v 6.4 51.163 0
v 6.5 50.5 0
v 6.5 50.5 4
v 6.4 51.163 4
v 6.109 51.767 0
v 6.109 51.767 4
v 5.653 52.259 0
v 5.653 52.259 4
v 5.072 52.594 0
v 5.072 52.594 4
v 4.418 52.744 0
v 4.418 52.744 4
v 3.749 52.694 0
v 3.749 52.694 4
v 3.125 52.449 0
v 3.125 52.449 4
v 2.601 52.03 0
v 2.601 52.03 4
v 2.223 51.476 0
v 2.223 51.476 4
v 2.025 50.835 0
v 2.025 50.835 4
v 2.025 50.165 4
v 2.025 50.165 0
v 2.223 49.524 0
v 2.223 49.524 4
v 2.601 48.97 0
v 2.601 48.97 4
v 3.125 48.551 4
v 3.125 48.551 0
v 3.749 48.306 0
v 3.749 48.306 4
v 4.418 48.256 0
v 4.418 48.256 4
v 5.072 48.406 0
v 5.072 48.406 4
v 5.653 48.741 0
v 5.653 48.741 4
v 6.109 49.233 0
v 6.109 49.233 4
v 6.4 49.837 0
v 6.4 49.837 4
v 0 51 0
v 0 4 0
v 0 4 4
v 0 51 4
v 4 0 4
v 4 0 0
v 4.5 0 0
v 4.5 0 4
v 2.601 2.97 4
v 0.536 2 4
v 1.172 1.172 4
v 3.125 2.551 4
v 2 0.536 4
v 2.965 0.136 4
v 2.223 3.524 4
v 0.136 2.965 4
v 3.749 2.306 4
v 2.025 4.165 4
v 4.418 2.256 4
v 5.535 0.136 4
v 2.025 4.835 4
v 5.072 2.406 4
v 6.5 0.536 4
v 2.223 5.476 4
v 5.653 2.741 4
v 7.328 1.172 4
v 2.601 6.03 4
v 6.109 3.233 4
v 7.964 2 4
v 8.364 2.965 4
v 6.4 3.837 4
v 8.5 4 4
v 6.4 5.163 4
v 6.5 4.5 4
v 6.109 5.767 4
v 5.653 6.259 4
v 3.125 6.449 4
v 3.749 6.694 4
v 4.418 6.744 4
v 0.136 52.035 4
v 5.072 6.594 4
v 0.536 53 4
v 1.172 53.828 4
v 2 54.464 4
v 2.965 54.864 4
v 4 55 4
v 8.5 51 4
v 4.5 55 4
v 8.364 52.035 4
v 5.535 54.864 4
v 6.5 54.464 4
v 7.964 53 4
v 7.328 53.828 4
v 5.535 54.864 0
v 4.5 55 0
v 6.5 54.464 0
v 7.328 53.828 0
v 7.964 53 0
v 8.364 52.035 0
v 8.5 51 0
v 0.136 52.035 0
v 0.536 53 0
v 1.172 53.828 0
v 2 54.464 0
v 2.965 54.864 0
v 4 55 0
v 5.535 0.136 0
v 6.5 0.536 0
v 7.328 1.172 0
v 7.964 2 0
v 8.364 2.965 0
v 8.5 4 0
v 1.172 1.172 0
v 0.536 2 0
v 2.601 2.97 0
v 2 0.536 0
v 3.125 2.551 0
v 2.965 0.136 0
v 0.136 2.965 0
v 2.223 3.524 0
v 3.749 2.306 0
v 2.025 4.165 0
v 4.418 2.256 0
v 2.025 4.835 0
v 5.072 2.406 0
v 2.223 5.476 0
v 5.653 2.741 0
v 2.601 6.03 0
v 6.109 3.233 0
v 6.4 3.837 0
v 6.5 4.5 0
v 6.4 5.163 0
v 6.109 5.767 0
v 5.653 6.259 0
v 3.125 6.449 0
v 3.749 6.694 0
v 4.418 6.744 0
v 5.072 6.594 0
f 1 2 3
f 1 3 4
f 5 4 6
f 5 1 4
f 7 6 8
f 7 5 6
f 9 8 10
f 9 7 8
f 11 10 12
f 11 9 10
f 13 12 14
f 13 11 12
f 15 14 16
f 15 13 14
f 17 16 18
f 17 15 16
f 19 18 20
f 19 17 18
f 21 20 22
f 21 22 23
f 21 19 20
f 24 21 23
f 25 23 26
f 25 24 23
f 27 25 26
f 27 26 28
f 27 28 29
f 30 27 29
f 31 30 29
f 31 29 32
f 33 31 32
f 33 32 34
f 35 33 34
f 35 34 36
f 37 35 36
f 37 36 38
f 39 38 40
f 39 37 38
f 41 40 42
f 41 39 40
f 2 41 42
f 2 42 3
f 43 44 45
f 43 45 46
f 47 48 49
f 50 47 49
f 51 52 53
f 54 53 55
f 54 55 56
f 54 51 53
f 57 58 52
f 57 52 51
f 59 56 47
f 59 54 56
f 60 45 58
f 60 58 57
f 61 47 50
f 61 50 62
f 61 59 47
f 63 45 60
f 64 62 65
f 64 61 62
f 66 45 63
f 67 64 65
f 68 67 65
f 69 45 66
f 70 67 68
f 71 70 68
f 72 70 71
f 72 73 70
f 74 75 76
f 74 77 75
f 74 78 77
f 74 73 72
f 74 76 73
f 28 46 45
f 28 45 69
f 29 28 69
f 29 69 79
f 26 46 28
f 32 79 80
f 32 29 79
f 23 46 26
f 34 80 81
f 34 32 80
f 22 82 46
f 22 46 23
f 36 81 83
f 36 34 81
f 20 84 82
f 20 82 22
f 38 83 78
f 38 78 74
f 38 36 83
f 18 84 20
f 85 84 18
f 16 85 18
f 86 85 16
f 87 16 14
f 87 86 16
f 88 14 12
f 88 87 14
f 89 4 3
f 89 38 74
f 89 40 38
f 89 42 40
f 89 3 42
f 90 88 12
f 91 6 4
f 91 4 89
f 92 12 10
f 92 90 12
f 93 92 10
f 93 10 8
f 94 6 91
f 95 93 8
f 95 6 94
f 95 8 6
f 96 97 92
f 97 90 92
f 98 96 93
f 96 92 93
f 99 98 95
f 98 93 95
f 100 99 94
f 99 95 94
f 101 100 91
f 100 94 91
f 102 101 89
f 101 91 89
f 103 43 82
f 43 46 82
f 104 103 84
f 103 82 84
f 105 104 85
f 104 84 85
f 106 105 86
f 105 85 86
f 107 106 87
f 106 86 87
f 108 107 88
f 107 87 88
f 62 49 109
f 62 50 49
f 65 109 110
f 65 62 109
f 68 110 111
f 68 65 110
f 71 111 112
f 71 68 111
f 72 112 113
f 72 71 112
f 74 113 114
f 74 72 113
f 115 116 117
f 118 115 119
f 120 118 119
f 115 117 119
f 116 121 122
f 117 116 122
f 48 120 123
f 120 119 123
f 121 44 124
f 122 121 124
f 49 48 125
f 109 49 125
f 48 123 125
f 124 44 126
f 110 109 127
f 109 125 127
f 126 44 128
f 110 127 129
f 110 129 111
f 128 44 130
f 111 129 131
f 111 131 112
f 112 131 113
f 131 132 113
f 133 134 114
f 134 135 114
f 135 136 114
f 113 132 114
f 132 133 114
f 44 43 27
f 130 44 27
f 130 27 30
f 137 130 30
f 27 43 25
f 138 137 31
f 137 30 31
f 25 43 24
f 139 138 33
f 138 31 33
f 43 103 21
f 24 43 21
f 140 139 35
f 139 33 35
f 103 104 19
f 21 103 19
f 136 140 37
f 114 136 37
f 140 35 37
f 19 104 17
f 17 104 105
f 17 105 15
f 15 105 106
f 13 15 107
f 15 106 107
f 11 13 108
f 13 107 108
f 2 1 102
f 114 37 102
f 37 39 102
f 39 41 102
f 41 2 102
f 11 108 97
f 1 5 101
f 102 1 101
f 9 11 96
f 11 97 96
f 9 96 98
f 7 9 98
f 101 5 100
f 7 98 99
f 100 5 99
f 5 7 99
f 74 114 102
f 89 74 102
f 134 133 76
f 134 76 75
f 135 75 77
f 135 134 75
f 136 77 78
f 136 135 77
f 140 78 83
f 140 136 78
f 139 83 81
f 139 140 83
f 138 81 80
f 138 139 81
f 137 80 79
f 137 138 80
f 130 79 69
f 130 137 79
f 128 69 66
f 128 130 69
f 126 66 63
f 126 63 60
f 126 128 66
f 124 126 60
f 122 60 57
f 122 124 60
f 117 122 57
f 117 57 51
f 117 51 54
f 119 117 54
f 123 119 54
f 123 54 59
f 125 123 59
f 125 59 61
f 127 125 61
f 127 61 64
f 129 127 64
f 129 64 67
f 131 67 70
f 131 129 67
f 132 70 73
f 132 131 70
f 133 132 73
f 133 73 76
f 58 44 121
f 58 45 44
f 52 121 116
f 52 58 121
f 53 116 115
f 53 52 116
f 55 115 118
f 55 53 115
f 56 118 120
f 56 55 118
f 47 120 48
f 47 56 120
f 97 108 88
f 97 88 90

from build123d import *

# Parameters (mm, degrees)
SKETCH_W  = 8.5
SKETCH_H  = 55
SKETCH_R  = 2.25
PAD_DEPTH = 4
FILLET_R  = 4


with BuildPart() as part:
    # Sketch → Pad (new body)
    with BuildSketch(Plane.XY):
        with Locations((4.25, 27.5)):
            Rectangle(SKETCH_W, SKETCH_H)
        with Locations((4.25, 4.5)):
            Circle(SKETCH_R, mode=Mode.SUBTRACT)
        with Locations((4.25, 50.5)):
            Circle(SKETCH_R, mode=Mode.SUBTRACT)
    extrude(amount=PAD_DEPTH)

    # Fillet
    fillet_edges = [part.edges().sort_by_distance(p)[0] for p in [
        (0, 55, 2),
        (8.5, 55, 2),
        (0, 0, 2),
        (8.5, 0, 2),
    ]]
    fillet(fillet_edges, radius=FILLET_R)


solid = part.part
